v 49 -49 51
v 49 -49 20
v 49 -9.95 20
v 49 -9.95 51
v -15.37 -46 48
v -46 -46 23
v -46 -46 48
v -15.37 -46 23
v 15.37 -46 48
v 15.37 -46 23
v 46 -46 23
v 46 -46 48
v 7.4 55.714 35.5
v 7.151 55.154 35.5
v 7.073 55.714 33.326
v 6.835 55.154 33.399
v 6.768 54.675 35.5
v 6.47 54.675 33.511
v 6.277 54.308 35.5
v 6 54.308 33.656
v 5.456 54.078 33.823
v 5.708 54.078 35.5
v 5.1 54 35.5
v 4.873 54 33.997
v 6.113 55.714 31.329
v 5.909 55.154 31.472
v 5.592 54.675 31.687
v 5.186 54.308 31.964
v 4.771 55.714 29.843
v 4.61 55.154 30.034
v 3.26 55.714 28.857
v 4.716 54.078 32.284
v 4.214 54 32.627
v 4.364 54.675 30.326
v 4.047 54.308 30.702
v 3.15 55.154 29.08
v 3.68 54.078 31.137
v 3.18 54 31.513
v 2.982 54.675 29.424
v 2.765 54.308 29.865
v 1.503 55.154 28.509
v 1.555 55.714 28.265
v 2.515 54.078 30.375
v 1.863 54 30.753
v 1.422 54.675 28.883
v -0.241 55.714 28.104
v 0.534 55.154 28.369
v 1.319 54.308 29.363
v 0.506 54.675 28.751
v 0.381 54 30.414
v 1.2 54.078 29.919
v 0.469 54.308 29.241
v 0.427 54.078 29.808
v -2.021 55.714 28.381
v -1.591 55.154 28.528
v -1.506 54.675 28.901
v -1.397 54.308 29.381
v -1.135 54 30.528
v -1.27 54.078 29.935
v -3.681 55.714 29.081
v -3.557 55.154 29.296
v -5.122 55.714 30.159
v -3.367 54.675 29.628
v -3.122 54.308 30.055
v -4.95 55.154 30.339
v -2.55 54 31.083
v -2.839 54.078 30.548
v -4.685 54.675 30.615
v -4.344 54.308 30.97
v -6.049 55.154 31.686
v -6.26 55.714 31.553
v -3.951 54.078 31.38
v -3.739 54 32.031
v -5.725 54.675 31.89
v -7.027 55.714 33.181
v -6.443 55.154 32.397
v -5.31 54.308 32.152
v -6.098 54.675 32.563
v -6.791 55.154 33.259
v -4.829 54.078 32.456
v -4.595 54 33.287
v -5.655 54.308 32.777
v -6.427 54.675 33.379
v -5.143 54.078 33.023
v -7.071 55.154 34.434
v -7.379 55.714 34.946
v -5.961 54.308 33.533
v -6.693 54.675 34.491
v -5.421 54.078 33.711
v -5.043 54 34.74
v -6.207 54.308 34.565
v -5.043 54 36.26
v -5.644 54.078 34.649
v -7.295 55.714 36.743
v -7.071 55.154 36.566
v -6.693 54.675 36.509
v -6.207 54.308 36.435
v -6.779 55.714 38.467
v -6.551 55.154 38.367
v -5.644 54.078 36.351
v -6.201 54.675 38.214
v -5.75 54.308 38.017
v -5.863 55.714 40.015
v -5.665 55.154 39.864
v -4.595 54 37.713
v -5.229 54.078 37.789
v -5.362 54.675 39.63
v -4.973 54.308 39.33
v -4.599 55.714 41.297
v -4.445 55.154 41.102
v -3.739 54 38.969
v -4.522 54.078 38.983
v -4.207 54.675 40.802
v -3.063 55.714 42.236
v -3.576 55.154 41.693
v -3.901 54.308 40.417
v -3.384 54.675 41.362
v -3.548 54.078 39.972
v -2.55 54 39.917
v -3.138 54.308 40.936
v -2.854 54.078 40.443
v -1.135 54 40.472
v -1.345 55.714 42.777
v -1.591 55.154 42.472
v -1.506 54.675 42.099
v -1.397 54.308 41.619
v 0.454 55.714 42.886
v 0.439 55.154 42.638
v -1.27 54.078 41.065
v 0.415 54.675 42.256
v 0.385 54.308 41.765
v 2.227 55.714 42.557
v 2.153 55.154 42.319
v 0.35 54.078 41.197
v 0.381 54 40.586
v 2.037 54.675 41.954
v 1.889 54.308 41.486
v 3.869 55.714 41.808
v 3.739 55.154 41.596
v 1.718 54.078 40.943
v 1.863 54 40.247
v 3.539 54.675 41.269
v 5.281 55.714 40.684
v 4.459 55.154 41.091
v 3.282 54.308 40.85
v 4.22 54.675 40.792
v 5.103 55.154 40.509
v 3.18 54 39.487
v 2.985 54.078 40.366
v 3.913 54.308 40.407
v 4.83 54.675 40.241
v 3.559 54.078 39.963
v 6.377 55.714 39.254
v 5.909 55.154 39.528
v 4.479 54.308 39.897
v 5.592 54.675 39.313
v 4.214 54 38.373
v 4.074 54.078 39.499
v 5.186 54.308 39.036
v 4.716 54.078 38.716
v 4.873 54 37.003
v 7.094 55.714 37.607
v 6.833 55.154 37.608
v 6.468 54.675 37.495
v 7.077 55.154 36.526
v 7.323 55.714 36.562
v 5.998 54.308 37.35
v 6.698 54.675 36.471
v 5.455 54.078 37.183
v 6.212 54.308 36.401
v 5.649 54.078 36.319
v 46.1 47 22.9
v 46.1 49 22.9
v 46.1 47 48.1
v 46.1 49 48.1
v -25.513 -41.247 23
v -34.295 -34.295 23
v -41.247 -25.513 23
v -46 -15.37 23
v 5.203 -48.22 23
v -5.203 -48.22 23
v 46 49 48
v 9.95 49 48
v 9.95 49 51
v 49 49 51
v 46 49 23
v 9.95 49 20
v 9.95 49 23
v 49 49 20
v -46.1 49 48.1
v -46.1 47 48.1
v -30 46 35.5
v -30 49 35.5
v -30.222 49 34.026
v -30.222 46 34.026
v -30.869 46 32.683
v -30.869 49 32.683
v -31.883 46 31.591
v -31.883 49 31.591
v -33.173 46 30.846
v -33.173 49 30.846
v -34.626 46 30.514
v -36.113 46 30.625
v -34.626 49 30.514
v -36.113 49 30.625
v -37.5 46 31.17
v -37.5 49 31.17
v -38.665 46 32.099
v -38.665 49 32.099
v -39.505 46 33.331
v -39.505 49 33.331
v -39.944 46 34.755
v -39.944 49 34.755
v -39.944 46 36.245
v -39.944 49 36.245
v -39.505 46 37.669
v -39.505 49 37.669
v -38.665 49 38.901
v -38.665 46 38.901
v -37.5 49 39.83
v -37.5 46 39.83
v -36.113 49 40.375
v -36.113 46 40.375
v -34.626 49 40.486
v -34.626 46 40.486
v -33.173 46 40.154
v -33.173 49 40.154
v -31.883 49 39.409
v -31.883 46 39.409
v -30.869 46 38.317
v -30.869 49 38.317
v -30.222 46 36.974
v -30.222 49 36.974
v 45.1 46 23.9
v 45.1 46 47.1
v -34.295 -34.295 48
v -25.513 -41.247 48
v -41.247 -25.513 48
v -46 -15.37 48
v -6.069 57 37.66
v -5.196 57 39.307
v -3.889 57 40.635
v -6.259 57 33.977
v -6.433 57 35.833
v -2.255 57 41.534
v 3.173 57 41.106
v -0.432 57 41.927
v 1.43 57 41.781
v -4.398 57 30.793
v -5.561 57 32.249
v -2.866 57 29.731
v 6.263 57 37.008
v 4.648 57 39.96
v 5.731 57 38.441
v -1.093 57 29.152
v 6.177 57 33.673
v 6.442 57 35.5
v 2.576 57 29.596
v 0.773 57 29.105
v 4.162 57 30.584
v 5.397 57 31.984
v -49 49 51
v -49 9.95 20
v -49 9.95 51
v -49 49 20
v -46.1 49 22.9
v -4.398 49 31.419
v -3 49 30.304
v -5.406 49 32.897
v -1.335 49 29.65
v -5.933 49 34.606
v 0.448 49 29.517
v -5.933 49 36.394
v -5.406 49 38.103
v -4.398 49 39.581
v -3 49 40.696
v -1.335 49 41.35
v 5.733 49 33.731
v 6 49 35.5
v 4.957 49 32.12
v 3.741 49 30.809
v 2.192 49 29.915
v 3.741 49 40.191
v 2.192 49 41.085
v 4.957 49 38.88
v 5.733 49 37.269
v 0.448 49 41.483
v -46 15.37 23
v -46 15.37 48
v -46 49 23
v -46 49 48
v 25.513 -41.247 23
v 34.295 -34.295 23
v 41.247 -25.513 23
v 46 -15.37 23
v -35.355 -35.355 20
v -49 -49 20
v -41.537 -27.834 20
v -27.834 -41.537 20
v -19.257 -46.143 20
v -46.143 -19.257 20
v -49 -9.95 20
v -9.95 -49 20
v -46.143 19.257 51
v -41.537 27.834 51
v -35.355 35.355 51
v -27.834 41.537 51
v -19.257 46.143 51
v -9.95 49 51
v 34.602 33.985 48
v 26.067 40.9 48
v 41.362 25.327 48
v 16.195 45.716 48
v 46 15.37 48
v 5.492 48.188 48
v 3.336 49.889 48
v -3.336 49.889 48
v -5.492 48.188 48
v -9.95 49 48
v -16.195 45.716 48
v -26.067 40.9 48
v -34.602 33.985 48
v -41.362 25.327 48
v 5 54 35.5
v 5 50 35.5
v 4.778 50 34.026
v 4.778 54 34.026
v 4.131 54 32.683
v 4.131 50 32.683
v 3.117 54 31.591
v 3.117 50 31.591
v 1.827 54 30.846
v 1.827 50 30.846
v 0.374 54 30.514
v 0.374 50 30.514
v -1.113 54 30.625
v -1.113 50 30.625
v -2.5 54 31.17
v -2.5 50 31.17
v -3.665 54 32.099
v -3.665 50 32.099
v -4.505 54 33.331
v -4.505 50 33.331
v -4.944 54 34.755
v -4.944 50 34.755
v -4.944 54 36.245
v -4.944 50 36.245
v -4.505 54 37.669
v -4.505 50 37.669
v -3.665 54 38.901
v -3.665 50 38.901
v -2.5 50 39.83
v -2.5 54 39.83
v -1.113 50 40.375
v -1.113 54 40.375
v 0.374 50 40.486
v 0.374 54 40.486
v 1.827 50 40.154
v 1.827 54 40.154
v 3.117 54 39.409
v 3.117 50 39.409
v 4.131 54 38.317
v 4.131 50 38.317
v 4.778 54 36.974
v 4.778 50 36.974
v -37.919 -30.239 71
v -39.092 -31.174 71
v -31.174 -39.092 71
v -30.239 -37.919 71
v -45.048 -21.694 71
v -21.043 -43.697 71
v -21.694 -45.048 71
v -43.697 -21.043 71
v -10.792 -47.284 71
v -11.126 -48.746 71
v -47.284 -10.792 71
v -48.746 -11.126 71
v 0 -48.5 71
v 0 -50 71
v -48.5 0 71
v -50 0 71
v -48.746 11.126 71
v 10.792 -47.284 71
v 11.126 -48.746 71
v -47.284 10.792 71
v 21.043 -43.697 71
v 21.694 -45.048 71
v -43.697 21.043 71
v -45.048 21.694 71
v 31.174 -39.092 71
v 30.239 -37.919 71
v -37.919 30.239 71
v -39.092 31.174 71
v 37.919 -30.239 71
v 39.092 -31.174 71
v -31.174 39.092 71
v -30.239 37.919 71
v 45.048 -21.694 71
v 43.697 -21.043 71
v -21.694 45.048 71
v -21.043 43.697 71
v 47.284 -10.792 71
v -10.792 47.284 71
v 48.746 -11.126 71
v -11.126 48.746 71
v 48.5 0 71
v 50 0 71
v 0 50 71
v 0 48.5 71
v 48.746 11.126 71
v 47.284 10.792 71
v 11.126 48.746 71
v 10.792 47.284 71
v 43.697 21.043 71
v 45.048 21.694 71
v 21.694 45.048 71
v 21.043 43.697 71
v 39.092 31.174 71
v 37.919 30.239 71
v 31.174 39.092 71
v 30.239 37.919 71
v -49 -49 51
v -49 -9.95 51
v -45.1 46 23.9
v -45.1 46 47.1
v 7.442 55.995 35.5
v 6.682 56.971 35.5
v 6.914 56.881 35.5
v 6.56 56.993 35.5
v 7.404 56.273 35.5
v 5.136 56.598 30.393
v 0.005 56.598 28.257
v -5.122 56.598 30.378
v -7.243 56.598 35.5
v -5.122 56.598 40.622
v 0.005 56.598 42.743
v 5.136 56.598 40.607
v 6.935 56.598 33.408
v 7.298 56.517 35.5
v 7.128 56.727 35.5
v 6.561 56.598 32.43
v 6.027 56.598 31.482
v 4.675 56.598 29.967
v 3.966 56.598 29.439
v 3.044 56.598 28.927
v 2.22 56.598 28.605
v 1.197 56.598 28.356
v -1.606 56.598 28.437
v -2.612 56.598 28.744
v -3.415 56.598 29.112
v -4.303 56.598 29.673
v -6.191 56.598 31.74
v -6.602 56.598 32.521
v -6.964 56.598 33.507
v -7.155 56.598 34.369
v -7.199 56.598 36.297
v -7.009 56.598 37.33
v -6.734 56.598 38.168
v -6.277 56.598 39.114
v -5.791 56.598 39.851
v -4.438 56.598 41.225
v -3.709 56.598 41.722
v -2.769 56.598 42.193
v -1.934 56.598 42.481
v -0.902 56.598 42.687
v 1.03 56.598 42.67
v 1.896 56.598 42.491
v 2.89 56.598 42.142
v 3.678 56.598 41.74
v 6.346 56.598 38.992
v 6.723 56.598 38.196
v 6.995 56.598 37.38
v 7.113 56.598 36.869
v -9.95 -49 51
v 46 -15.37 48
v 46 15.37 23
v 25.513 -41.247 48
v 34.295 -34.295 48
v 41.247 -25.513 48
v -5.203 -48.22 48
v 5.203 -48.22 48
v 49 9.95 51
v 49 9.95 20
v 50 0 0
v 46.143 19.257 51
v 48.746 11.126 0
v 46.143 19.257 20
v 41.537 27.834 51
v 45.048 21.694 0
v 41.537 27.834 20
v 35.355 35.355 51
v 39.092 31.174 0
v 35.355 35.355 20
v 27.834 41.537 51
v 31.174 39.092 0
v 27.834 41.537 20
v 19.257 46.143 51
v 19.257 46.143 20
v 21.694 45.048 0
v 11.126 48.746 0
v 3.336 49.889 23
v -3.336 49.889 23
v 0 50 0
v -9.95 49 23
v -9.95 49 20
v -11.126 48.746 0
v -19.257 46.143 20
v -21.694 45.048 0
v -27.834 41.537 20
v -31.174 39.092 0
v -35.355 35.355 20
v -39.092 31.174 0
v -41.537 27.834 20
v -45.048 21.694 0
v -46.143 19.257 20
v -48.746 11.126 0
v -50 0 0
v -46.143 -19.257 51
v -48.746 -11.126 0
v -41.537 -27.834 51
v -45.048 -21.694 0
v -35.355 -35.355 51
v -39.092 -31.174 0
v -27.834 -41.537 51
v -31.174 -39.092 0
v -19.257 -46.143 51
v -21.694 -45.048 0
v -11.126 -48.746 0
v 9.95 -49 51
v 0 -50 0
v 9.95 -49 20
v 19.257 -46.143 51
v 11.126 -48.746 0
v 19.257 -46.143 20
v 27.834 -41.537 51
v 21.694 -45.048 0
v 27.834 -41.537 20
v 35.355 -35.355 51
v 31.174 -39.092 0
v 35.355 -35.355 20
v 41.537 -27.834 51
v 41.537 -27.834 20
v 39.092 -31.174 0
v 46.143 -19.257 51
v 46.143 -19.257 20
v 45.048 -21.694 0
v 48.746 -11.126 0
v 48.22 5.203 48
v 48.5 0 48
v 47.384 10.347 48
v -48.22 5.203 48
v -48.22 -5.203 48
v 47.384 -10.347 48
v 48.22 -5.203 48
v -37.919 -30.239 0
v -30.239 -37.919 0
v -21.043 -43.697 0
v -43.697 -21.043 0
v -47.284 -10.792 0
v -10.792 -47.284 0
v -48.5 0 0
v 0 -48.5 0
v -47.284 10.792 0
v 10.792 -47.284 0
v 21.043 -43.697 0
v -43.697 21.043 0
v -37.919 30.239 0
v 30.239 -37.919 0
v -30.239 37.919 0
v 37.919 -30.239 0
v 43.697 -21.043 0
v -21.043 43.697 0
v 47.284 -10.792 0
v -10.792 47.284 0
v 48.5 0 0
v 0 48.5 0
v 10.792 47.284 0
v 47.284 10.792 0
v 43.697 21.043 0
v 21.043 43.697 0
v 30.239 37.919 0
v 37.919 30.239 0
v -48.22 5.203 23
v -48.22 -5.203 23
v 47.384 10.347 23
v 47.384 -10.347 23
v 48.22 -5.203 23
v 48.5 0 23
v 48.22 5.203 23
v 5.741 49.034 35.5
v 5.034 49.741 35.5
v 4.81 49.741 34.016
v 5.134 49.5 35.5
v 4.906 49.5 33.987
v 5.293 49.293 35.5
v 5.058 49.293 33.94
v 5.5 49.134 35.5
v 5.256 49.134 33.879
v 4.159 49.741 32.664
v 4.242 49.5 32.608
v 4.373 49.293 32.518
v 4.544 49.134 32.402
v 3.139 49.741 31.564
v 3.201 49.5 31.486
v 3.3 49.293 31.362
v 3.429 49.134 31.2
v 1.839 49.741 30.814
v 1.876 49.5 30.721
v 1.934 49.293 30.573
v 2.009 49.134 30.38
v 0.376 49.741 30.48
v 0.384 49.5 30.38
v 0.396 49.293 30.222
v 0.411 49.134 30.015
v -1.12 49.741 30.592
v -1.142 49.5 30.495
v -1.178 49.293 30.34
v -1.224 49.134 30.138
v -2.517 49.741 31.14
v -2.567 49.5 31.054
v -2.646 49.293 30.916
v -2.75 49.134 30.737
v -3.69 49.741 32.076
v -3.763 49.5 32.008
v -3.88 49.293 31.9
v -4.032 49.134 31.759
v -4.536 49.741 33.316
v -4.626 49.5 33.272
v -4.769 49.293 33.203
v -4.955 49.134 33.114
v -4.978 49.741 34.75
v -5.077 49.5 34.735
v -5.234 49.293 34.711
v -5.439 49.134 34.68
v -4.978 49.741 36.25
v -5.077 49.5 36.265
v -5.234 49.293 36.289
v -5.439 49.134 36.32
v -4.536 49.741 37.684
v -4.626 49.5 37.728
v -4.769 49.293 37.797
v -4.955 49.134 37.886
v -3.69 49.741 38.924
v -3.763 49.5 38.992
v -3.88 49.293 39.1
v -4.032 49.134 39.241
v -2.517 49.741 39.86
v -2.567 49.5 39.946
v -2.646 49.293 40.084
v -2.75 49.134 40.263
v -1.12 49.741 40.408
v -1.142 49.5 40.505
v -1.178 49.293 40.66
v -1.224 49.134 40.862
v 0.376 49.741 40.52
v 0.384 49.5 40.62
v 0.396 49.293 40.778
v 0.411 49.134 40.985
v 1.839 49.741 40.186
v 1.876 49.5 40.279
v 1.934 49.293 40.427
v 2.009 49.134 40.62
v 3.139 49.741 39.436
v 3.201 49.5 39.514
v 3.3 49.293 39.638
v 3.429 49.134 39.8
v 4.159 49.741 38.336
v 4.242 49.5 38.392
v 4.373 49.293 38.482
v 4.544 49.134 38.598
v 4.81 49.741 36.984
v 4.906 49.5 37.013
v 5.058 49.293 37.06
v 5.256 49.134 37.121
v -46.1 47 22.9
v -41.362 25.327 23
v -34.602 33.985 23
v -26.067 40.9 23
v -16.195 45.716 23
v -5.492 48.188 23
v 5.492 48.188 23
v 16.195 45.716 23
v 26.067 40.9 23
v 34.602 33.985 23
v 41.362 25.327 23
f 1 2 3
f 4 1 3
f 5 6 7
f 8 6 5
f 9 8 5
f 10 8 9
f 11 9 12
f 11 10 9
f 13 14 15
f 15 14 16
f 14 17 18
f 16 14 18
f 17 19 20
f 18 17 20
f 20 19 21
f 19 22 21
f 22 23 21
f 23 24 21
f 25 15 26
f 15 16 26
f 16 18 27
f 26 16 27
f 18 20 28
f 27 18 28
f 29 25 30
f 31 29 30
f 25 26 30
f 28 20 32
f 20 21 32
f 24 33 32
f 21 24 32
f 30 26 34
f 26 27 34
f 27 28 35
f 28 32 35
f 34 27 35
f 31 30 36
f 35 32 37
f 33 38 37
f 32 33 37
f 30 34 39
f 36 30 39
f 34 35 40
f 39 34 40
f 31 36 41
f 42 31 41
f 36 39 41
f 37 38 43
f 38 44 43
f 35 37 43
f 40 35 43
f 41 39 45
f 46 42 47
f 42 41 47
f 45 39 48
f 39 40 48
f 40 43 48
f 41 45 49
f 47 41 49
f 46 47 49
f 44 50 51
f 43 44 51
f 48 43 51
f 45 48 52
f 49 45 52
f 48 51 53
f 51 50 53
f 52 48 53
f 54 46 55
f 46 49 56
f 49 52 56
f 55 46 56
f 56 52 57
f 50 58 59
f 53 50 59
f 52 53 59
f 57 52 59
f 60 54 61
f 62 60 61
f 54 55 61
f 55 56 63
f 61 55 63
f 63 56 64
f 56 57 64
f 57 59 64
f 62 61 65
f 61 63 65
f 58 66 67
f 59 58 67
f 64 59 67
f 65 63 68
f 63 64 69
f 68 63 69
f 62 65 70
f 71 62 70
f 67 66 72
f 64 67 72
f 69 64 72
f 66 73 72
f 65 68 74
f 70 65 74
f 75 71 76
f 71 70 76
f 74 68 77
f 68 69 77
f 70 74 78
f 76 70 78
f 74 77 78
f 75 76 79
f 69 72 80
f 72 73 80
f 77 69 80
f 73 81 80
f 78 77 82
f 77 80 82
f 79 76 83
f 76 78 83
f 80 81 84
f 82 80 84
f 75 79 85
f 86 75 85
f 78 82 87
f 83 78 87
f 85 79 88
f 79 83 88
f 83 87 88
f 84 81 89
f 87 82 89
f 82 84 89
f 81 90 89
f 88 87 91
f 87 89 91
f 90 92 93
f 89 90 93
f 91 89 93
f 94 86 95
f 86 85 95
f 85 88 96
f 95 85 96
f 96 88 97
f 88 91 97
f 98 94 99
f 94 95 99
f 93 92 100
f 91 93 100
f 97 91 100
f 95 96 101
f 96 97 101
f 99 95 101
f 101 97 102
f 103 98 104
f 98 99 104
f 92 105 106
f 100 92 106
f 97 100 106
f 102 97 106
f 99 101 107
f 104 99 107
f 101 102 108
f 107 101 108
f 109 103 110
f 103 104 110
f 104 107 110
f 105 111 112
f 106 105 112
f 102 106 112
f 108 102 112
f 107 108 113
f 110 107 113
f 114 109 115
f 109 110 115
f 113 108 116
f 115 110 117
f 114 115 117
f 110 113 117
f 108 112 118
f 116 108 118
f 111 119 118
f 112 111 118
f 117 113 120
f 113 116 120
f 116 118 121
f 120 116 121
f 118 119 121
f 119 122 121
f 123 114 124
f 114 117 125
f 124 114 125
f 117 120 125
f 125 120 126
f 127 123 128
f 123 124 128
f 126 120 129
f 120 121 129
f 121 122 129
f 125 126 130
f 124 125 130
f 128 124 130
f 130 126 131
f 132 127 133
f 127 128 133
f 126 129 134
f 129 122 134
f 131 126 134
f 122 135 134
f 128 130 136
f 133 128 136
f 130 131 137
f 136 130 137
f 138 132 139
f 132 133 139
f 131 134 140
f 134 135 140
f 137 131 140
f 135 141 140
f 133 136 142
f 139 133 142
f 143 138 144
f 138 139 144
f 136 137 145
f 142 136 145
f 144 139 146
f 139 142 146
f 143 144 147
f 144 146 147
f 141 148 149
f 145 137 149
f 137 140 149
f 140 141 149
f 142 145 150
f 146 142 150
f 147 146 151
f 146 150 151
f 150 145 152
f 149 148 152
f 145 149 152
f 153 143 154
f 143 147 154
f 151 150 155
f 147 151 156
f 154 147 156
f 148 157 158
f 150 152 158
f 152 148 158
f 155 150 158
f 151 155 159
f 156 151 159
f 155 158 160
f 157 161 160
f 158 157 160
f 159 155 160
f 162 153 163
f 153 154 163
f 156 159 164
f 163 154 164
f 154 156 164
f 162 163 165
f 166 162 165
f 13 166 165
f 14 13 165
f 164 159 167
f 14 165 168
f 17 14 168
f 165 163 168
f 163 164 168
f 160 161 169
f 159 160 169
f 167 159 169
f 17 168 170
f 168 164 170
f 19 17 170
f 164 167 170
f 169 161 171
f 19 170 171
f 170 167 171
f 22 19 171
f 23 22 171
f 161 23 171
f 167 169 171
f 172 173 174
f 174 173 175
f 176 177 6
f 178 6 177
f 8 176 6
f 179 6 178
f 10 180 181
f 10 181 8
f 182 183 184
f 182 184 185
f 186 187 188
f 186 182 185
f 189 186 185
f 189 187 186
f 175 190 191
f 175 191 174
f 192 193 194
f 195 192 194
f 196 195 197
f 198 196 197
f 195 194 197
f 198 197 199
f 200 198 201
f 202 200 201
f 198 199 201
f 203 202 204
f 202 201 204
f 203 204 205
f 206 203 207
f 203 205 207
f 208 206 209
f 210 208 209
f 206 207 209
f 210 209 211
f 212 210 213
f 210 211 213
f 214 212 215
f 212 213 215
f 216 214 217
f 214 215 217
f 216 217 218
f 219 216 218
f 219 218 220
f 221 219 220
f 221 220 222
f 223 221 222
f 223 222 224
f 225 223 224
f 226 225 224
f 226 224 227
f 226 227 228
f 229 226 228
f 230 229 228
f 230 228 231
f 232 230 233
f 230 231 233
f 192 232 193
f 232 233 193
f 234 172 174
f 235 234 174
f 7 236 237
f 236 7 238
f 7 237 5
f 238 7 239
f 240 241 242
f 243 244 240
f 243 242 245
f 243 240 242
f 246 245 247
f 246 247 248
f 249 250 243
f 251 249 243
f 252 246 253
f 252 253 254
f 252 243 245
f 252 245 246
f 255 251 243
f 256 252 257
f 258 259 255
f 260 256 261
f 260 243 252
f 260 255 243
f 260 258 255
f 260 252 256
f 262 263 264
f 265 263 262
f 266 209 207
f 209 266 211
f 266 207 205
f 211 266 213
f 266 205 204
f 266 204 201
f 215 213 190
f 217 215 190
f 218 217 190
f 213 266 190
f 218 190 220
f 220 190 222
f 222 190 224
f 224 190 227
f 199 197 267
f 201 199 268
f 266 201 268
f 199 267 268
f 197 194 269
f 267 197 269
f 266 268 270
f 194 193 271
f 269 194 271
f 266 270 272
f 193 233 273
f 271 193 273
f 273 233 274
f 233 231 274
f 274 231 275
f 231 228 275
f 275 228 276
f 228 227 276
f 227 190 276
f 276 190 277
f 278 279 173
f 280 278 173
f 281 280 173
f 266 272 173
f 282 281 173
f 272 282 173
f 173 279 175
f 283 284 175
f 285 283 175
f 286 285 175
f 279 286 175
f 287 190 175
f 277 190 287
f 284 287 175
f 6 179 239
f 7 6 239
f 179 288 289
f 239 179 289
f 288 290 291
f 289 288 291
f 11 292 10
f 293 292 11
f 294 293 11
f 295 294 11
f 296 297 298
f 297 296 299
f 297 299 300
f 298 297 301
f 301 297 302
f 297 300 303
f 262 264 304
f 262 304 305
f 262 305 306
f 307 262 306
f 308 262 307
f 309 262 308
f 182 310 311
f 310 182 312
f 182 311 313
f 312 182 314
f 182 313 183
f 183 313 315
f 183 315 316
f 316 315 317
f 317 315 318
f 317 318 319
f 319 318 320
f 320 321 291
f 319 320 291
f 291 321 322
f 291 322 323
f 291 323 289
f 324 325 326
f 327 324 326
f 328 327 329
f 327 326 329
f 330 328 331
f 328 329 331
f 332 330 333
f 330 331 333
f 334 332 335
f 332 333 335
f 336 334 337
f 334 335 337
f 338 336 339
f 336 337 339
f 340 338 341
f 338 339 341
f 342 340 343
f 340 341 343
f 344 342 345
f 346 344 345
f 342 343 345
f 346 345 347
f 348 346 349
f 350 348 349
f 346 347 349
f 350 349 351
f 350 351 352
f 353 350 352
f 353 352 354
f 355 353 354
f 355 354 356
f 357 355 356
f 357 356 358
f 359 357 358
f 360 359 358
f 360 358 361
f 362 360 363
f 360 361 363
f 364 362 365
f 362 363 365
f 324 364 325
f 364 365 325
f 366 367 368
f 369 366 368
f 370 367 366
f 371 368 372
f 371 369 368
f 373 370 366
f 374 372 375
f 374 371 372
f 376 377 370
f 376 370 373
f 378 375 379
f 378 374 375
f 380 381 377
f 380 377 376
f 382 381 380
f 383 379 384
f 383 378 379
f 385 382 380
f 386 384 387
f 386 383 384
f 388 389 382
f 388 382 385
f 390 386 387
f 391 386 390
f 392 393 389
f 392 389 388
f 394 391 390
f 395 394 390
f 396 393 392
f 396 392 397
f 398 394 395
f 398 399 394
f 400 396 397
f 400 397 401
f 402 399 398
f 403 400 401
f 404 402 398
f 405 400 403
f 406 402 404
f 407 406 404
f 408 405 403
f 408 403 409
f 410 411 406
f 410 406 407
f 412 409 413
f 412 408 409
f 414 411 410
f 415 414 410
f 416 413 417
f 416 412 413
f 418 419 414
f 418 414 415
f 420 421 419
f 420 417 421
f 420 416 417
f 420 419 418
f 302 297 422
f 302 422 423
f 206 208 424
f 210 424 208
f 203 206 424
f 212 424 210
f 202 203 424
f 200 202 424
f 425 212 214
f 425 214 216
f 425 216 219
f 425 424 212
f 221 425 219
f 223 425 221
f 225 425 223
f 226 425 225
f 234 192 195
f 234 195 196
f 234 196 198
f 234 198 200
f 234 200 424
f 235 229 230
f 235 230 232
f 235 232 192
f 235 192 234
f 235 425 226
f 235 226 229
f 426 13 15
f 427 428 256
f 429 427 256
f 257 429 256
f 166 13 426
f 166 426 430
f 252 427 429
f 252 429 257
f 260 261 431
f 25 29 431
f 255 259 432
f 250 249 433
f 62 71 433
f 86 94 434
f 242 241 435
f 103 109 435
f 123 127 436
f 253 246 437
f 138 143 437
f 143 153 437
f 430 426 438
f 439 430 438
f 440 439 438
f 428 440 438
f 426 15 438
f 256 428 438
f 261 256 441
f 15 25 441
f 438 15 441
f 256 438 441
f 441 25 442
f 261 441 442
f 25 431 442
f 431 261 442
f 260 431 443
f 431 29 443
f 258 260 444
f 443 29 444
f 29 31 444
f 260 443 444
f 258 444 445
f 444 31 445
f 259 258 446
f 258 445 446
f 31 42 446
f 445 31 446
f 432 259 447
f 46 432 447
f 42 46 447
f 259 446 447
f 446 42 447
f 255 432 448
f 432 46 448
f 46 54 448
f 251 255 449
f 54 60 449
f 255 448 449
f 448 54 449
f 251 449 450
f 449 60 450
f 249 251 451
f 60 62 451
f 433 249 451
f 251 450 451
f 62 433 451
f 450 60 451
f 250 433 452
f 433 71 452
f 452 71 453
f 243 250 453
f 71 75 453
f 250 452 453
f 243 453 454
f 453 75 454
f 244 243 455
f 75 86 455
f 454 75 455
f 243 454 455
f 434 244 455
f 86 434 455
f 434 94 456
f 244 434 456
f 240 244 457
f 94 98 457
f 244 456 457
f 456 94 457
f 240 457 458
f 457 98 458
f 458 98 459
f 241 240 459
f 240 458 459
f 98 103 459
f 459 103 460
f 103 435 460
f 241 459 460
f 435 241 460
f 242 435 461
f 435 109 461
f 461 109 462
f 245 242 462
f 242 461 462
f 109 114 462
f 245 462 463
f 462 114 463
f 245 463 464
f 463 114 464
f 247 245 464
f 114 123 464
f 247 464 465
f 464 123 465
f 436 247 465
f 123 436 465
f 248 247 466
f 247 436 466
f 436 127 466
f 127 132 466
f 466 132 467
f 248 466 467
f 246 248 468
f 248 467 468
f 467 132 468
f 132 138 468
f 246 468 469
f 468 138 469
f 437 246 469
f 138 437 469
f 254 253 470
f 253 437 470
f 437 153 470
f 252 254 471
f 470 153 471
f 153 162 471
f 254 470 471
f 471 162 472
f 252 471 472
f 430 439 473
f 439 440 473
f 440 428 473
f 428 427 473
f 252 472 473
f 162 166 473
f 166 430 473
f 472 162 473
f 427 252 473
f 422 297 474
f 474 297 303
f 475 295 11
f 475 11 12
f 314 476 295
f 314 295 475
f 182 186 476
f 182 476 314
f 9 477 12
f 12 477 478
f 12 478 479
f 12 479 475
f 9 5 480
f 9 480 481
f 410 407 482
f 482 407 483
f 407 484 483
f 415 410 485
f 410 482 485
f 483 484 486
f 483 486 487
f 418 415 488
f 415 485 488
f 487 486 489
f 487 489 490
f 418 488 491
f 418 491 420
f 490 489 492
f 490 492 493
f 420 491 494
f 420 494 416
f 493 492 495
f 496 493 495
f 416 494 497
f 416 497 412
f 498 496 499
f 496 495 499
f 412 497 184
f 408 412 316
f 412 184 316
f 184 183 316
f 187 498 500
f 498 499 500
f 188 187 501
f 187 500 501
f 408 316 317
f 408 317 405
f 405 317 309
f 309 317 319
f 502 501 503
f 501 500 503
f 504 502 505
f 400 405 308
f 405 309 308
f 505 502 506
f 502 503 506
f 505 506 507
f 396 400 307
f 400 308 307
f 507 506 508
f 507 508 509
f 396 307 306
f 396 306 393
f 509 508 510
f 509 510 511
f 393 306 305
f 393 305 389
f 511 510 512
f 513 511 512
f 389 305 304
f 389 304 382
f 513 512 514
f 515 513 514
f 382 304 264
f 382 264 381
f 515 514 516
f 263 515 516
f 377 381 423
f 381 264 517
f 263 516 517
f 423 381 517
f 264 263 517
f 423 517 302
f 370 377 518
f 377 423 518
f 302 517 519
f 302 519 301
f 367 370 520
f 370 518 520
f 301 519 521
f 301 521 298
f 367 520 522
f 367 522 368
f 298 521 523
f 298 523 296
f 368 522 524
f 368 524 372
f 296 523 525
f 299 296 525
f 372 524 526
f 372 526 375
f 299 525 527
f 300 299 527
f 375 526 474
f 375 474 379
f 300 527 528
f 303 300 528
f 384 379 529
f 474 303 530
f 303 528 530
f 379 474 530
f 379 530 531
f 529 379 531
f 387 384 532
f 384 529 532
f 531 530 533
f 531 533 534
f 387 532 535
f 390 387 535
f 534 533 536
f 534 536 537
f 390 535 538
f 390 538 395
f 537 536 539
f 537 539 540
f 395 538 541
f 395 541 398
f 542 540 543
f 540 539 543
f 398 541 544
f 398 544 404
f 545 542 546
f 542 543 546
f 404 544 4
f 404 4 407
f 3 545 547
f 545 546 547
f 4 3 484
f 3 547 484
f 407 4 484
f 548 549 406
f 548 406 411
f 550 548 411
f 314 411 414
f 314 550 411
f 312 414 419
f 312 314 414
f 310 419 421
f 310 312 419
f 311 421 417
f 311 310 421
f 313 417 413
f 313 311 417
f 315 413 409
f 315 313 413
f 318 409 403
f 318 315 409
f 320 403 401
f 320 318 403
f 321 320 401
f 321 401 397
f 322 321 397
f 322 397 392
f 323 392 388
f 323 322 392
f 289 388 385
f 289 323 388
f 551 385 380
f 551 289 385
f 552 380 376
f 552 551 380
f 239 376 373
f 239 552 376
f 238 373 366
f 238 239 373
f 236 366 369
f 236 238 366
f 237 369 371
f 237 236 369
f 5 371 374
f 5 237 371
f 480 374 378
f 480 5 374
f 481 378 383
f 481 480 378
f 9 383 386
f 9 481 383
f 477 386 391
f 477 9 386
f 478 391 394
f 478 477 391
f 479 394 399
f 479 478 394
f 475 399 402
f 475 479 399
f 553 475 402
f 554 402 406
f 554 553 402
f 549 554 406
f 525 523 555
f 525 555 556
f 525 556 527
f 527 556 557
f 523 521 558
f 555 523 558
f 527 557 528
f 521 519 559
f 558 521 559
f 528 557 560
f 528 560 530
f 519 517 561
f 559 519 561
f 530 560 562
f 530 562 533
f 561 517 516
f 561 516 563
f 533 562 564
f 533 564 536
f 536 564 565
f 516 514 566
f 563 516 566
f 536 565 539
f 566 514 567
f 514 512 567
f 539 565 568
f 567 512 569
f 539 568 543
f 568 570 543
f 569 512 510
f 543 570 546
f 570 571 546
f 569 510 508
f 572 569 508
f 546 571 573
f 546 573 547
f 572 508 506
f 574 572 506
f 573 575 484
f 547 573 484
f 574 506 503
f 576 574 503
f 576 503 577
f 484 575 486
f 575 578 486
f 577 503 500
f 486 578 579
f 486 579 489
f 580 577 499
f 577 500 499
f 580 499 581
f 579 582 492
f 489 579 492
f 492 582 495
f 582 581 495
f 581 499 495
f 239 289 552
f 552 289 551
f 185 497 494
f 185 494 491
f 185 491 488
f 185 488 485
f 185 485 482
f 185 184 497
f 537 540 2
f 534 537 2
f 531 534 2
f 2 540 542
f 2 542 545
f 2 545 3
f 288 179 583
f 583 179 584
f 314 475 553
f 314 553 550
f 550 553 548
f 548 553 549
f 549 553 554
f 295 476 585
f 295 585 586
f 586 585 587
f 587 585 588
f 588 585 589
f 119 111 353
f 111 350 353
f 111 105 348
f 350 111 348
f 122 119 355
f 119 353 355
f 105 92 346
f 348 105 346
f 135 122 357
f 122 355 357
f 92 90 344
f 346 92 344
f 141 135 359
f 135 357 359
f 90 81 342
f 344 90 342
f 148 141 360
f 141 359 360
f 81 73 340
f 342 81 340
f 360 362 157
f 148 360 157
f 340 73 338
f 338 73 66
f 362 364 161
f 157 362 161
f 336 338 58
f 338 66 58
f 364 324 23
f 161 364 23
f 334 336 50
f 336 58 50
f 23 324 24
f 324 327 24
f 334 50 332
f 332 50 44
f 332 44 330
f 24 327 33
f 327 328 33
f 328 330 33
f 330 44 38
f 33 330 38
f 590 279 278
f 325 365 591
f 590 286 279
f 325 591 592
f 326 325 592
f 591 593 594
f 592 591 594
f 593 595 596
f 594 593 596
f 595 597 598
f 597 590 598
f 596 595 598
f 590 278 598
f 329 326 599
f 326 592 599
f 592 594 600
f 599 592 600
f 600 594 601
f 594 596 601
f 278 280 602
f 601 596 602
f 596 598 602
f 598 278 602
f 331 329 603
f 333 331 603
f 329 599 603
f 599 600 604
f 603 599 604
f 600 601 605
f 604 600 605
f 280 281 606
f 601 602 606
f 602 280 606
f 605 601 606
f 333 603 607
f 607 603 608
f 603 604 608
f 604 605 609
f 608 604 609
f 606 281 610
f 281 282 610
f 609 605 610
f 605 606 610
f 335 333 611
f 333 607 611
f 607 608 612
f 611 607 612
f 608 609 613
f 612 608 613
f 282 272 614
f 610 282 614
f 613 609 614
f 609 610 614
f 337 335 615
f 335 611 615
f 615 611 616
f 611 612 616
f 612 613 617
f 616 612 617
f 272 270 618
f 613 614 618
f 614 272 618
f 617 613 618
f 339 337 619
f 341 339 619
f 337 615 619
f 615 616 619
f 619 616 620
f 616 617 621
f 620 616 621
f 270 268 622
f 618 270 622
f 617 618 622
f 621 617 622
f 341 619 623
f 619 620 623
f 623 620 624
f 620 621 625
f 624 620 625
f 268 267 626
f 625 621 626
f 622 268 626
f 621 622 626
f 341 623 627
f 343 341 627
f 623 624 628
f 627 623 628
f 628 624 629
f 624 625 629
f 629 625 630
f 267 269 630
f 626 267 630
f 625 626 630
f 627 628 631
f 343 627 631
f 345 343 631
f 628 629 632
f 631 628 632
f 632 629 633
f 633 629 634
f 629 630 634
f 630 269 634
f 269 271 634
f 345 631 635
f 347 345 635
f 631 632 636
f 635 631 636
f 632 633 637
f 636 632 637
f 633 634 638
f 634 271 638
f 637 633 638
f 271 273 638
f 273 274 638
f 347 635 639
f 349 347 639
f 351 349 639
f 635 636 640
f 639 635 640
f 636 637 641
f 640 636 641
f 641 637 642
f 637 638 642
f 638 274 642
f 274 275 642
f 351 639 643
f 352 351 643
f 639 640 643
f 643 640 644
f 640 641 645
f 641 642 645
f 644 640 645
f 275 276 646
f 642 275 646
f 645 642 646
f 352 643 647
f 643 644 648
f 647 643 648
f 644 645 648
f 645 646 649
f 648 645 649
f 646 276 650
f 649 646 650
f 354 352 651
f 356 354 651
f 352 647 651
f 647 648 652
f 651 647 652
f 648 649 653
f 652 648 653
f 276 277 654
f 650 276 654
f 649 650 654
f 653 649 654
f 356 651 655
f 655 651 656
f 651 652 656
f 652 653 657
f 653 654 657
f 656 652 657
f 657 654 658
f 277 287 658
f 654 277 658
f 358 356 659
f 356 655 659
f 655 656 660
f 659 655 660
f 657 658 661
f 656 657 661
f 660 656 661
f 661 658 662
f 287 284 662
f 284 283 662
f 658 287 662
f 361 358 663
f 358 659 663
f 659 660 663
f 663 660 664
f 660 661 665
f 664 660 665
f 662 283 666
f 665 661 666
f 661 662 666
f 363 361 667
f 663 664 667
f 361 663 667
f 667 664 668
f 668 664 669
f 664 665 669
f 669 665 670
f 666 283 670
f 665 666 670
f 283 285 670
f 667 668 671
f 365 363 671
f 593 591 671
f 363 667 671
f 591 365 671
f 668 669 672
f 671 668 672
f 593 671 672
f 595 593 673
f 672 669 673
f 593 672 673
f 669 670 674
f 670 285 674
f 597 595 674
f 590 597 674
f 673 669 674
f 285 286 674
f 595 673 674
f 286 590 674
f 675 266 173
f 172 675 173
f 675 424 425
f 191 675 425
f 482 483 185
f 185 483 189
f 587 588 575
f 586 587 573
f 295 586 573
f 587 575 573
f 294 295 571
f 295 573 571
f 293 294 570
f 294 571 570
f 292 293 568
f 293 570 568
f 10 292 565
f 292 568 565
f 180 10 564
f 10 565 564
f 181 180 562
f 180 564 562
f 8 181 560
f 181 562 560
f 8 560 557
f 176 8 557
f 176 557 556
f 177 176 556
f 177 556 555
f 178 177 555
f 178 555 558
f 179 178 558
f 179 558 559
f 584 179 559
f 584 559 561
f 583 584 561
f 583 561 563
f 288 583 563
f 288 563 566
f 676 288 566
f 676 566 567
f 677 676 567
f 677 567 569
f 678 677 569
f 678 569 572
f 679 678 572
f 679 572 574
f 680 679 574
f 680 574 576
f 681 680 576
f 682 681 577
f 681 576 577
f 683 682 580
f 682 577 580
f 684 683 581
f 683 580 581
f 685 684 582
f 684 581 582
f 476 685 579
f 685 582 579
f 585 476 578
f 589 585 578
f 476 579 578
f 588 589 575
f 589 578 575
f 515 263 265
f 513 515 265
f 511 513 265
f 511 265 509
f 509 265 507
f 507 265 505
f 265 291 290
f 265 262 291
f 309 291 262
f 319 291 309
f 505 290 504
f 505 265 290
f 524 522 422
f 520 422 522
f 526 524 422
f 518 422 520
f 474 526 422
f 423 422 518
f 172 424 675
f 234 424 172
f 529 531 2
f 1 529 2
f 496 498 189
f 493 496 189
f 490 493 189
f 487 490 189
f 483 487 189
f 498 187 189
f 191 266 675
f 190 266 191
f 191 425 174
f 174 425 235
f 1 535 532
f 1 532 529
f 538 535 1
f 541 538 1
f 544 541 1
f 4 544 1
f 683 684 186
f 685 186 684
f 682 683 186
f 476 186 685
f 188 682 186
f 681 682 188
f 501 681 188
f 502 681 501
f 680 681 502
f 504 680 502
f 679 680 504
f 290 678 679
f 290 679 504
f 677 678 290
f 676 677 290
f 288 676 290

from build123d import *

# Parameters (mm, degrees)
SKETCH_R        = 50
PAD_DEPTH       = 51
SKETCH004_W     = 98
SKETCH004_H     = 98
PAD001_DEPTH    = 31
SKETCH005_R     = 50
PAD002_DEPTH    = 23
SKETCH006_R     = 48.5
POCKET001_DEPTH = 23
SKETCH007_W     = 92
SKETCH007_H     = 92
POCKET002_DEPTH = 25
SKETCH008_R     = 48.5
POCKET_DEPTH    = 23
SKETCH009_W     = 92
SKETCH009_H     = 25
POCKET003_DEPTH = 3
POCKET005_DEPTH = 1.001
SKETCH010_W     = 92.2
SKETCH010_H     = 25.2
PAD003_DEPTH    = 3
SKETCH011_R     = 5
POCKET004_DEPTH = 3
CHAMFER_SIZE    = 1
SKETCH012_R     = 5
PAD004_DEPTH    = 5
SKETCH013_R     = 7.5
PAD005_DEPTH    = 3
FILLET_R        = 2.4
FILLET001_R     = 1
FILLET002_R     = 1


with BuildPart() as body:
    # Sketch → Pad (new body)
    with BuildSketch(Plane.XY):
        Circle(SKETCH_R)
    extrude(amount=PAD_DEPTH)

    # Sketch004 (on DatumPlane) → Pad001 (join)
    with BuildSketch(Plane.XY.offset(20)):
        Rectangle(SKETCH004_W, SKETCH004_H)
    extrude(amount=PAD001_DEPTH)

    # Sketch005 (on DatumPlane) → Pad002 (join)
    with BuildSketch(Plane.XY.offset(48)):
        Circle(SKETCH005_R)
    extrude(amount=PAD002_DEPTH)

    # Sketch006 (on DatumPlane) → Pocket001 (cut)
    with BuildSketch(Plane.XY.offset(48)):
        Circle(SKETCH006_R)
    extrude(amount=POCKET001_DEPTH, mode=Mode.SUBTRACT)

    # Sketch007 (on DatumPlane) → Pocket002 (cut)
    with BuildSketch(Plane.XY.offset(23)):
        Rectangle(SKETCH007_W, SKETCH007_H)
    extrude(amount=POCKET002_DEPTH, mode=Mode.SUBTRACT)

    # Sketch008 (on Face1 of Pocket002) → Pocket (cut)
    with BuildSketch(Plane(origin=(0, 0, 0), x_dir=(1, 0, 0), z_dir=(0, 0, -1))):
        Circle(SKETCH008_R)
    extrude(amount=-POCKET_DEPTH, mode=Mode.SUBTRACT)

    # Sketch009 (on Face9 of Pocket) → Pocket003 (cut)
    with BuildSketch(Plane(origin=(0, 49, 0), x_dir=(-1, 0, 0), z_dir=(0, 1, 0))):
        with Locations((0, 35.5)):
            Rectangle(SKETCH009_W, SKETCH009_H)
    extrude(amount=-POCKET003_DEPTH, mode=Mode.SUBTRACT)

    # Sketch009 (on Face9 of Pocket) → Pocket005 (cut, through all)
    with BuildSketch(Plane(origin=(0, 49, 0), x_dir=(-1, 0, 0), z_dir=(0, 1, 0))):
        with Locations((0, 35.5)):
            Rectangle(SKETCH009_W, SKETCH009_H)
    extrude(amount=POCKET005_DEPTH, mode=Mode.SUBTRACT)


with BuildPart() as lid:
    # Sketch010 (on DatumPlane) → Pad003 (new body)
    with BuildSketch(Plane.XZ.offset(-49)):
        with Locations((0, 35.5)):
            Rectangle(SKETCH010_W, SKETCH010_H)
    extrude(amount=PAD003_DEPTH)

    # Sketch011 (on Face5 of Pad003) → Pocket004 (cut)
    with BuildSketch(Plane(origin=(0, 49, 0), x_dir=(1, 0, 0), z_dir=(0, 1, 0))):
        with Locations((-35, -35.5)):
            Circle(SKETCH011_R)
    extrude(amount=-POCKET004_DEPTH, mode=Mode.SUBTRACT)

    # Chamfer
    chamfer_edges = [lid.edges().sort_by_distance(p)[0] for p in [
        (46.1, 46, 35.5),
        (0, 46, 48.1),
        (-46.1, 46, 35.5),
        (0, 46, 22.9),
    ]]
    chamfer(chamfer_edges, length=CHAMFER_SIZE)

    # Sketch012 (on Face4 of Pocket004) → Pad004 (join)
    with BuildSketch(Plane(origin=(0, 49, 0), x_dir=(1, 0, 0), z_dir=(0, 1, 0))):
        with Locations((0, -35.5)):
            Circle(SKETCH012_R)
    extrude(amount=PAD004_DEPTH)

    # Sketch013 (on Face13 of Pad004) → Pad005 (join)
    with BuildSketch(Plane(origin=(0, 54, 0), x_dir=(1, 0, 0), z_dir=(0, 1, 0))):
        with Locations((0, -35.5)):
            Circle(SKETCH013_R)
    extrude(amount=PAD005_DEPTH)

    # Fillet
    fillet_edges = [lid.edges().sort_by_distance(p)[0] for p in [
        (-7.5, 54, 35.5),
    ]]
    fillet(fillet_edges, radius=FILLET_R)

    # Fillet001
    fillet001_edges = [lid.edges().sort_by_distance(p)[0] for p in [
        (-7.5, 57, 35.5),
    ]]
    fillet(fillet001_edges, radius=FILLET001_R)

    # Fillet002
    fillet002_edges = [lid.edges().sort_by_distance(p)[0] for p in [
        (-5, 49, 35.5),
    ]]
    fillet(fillet002_edges, radius=FILLET002_R)


solid = Compound([body.part, lid.part])
